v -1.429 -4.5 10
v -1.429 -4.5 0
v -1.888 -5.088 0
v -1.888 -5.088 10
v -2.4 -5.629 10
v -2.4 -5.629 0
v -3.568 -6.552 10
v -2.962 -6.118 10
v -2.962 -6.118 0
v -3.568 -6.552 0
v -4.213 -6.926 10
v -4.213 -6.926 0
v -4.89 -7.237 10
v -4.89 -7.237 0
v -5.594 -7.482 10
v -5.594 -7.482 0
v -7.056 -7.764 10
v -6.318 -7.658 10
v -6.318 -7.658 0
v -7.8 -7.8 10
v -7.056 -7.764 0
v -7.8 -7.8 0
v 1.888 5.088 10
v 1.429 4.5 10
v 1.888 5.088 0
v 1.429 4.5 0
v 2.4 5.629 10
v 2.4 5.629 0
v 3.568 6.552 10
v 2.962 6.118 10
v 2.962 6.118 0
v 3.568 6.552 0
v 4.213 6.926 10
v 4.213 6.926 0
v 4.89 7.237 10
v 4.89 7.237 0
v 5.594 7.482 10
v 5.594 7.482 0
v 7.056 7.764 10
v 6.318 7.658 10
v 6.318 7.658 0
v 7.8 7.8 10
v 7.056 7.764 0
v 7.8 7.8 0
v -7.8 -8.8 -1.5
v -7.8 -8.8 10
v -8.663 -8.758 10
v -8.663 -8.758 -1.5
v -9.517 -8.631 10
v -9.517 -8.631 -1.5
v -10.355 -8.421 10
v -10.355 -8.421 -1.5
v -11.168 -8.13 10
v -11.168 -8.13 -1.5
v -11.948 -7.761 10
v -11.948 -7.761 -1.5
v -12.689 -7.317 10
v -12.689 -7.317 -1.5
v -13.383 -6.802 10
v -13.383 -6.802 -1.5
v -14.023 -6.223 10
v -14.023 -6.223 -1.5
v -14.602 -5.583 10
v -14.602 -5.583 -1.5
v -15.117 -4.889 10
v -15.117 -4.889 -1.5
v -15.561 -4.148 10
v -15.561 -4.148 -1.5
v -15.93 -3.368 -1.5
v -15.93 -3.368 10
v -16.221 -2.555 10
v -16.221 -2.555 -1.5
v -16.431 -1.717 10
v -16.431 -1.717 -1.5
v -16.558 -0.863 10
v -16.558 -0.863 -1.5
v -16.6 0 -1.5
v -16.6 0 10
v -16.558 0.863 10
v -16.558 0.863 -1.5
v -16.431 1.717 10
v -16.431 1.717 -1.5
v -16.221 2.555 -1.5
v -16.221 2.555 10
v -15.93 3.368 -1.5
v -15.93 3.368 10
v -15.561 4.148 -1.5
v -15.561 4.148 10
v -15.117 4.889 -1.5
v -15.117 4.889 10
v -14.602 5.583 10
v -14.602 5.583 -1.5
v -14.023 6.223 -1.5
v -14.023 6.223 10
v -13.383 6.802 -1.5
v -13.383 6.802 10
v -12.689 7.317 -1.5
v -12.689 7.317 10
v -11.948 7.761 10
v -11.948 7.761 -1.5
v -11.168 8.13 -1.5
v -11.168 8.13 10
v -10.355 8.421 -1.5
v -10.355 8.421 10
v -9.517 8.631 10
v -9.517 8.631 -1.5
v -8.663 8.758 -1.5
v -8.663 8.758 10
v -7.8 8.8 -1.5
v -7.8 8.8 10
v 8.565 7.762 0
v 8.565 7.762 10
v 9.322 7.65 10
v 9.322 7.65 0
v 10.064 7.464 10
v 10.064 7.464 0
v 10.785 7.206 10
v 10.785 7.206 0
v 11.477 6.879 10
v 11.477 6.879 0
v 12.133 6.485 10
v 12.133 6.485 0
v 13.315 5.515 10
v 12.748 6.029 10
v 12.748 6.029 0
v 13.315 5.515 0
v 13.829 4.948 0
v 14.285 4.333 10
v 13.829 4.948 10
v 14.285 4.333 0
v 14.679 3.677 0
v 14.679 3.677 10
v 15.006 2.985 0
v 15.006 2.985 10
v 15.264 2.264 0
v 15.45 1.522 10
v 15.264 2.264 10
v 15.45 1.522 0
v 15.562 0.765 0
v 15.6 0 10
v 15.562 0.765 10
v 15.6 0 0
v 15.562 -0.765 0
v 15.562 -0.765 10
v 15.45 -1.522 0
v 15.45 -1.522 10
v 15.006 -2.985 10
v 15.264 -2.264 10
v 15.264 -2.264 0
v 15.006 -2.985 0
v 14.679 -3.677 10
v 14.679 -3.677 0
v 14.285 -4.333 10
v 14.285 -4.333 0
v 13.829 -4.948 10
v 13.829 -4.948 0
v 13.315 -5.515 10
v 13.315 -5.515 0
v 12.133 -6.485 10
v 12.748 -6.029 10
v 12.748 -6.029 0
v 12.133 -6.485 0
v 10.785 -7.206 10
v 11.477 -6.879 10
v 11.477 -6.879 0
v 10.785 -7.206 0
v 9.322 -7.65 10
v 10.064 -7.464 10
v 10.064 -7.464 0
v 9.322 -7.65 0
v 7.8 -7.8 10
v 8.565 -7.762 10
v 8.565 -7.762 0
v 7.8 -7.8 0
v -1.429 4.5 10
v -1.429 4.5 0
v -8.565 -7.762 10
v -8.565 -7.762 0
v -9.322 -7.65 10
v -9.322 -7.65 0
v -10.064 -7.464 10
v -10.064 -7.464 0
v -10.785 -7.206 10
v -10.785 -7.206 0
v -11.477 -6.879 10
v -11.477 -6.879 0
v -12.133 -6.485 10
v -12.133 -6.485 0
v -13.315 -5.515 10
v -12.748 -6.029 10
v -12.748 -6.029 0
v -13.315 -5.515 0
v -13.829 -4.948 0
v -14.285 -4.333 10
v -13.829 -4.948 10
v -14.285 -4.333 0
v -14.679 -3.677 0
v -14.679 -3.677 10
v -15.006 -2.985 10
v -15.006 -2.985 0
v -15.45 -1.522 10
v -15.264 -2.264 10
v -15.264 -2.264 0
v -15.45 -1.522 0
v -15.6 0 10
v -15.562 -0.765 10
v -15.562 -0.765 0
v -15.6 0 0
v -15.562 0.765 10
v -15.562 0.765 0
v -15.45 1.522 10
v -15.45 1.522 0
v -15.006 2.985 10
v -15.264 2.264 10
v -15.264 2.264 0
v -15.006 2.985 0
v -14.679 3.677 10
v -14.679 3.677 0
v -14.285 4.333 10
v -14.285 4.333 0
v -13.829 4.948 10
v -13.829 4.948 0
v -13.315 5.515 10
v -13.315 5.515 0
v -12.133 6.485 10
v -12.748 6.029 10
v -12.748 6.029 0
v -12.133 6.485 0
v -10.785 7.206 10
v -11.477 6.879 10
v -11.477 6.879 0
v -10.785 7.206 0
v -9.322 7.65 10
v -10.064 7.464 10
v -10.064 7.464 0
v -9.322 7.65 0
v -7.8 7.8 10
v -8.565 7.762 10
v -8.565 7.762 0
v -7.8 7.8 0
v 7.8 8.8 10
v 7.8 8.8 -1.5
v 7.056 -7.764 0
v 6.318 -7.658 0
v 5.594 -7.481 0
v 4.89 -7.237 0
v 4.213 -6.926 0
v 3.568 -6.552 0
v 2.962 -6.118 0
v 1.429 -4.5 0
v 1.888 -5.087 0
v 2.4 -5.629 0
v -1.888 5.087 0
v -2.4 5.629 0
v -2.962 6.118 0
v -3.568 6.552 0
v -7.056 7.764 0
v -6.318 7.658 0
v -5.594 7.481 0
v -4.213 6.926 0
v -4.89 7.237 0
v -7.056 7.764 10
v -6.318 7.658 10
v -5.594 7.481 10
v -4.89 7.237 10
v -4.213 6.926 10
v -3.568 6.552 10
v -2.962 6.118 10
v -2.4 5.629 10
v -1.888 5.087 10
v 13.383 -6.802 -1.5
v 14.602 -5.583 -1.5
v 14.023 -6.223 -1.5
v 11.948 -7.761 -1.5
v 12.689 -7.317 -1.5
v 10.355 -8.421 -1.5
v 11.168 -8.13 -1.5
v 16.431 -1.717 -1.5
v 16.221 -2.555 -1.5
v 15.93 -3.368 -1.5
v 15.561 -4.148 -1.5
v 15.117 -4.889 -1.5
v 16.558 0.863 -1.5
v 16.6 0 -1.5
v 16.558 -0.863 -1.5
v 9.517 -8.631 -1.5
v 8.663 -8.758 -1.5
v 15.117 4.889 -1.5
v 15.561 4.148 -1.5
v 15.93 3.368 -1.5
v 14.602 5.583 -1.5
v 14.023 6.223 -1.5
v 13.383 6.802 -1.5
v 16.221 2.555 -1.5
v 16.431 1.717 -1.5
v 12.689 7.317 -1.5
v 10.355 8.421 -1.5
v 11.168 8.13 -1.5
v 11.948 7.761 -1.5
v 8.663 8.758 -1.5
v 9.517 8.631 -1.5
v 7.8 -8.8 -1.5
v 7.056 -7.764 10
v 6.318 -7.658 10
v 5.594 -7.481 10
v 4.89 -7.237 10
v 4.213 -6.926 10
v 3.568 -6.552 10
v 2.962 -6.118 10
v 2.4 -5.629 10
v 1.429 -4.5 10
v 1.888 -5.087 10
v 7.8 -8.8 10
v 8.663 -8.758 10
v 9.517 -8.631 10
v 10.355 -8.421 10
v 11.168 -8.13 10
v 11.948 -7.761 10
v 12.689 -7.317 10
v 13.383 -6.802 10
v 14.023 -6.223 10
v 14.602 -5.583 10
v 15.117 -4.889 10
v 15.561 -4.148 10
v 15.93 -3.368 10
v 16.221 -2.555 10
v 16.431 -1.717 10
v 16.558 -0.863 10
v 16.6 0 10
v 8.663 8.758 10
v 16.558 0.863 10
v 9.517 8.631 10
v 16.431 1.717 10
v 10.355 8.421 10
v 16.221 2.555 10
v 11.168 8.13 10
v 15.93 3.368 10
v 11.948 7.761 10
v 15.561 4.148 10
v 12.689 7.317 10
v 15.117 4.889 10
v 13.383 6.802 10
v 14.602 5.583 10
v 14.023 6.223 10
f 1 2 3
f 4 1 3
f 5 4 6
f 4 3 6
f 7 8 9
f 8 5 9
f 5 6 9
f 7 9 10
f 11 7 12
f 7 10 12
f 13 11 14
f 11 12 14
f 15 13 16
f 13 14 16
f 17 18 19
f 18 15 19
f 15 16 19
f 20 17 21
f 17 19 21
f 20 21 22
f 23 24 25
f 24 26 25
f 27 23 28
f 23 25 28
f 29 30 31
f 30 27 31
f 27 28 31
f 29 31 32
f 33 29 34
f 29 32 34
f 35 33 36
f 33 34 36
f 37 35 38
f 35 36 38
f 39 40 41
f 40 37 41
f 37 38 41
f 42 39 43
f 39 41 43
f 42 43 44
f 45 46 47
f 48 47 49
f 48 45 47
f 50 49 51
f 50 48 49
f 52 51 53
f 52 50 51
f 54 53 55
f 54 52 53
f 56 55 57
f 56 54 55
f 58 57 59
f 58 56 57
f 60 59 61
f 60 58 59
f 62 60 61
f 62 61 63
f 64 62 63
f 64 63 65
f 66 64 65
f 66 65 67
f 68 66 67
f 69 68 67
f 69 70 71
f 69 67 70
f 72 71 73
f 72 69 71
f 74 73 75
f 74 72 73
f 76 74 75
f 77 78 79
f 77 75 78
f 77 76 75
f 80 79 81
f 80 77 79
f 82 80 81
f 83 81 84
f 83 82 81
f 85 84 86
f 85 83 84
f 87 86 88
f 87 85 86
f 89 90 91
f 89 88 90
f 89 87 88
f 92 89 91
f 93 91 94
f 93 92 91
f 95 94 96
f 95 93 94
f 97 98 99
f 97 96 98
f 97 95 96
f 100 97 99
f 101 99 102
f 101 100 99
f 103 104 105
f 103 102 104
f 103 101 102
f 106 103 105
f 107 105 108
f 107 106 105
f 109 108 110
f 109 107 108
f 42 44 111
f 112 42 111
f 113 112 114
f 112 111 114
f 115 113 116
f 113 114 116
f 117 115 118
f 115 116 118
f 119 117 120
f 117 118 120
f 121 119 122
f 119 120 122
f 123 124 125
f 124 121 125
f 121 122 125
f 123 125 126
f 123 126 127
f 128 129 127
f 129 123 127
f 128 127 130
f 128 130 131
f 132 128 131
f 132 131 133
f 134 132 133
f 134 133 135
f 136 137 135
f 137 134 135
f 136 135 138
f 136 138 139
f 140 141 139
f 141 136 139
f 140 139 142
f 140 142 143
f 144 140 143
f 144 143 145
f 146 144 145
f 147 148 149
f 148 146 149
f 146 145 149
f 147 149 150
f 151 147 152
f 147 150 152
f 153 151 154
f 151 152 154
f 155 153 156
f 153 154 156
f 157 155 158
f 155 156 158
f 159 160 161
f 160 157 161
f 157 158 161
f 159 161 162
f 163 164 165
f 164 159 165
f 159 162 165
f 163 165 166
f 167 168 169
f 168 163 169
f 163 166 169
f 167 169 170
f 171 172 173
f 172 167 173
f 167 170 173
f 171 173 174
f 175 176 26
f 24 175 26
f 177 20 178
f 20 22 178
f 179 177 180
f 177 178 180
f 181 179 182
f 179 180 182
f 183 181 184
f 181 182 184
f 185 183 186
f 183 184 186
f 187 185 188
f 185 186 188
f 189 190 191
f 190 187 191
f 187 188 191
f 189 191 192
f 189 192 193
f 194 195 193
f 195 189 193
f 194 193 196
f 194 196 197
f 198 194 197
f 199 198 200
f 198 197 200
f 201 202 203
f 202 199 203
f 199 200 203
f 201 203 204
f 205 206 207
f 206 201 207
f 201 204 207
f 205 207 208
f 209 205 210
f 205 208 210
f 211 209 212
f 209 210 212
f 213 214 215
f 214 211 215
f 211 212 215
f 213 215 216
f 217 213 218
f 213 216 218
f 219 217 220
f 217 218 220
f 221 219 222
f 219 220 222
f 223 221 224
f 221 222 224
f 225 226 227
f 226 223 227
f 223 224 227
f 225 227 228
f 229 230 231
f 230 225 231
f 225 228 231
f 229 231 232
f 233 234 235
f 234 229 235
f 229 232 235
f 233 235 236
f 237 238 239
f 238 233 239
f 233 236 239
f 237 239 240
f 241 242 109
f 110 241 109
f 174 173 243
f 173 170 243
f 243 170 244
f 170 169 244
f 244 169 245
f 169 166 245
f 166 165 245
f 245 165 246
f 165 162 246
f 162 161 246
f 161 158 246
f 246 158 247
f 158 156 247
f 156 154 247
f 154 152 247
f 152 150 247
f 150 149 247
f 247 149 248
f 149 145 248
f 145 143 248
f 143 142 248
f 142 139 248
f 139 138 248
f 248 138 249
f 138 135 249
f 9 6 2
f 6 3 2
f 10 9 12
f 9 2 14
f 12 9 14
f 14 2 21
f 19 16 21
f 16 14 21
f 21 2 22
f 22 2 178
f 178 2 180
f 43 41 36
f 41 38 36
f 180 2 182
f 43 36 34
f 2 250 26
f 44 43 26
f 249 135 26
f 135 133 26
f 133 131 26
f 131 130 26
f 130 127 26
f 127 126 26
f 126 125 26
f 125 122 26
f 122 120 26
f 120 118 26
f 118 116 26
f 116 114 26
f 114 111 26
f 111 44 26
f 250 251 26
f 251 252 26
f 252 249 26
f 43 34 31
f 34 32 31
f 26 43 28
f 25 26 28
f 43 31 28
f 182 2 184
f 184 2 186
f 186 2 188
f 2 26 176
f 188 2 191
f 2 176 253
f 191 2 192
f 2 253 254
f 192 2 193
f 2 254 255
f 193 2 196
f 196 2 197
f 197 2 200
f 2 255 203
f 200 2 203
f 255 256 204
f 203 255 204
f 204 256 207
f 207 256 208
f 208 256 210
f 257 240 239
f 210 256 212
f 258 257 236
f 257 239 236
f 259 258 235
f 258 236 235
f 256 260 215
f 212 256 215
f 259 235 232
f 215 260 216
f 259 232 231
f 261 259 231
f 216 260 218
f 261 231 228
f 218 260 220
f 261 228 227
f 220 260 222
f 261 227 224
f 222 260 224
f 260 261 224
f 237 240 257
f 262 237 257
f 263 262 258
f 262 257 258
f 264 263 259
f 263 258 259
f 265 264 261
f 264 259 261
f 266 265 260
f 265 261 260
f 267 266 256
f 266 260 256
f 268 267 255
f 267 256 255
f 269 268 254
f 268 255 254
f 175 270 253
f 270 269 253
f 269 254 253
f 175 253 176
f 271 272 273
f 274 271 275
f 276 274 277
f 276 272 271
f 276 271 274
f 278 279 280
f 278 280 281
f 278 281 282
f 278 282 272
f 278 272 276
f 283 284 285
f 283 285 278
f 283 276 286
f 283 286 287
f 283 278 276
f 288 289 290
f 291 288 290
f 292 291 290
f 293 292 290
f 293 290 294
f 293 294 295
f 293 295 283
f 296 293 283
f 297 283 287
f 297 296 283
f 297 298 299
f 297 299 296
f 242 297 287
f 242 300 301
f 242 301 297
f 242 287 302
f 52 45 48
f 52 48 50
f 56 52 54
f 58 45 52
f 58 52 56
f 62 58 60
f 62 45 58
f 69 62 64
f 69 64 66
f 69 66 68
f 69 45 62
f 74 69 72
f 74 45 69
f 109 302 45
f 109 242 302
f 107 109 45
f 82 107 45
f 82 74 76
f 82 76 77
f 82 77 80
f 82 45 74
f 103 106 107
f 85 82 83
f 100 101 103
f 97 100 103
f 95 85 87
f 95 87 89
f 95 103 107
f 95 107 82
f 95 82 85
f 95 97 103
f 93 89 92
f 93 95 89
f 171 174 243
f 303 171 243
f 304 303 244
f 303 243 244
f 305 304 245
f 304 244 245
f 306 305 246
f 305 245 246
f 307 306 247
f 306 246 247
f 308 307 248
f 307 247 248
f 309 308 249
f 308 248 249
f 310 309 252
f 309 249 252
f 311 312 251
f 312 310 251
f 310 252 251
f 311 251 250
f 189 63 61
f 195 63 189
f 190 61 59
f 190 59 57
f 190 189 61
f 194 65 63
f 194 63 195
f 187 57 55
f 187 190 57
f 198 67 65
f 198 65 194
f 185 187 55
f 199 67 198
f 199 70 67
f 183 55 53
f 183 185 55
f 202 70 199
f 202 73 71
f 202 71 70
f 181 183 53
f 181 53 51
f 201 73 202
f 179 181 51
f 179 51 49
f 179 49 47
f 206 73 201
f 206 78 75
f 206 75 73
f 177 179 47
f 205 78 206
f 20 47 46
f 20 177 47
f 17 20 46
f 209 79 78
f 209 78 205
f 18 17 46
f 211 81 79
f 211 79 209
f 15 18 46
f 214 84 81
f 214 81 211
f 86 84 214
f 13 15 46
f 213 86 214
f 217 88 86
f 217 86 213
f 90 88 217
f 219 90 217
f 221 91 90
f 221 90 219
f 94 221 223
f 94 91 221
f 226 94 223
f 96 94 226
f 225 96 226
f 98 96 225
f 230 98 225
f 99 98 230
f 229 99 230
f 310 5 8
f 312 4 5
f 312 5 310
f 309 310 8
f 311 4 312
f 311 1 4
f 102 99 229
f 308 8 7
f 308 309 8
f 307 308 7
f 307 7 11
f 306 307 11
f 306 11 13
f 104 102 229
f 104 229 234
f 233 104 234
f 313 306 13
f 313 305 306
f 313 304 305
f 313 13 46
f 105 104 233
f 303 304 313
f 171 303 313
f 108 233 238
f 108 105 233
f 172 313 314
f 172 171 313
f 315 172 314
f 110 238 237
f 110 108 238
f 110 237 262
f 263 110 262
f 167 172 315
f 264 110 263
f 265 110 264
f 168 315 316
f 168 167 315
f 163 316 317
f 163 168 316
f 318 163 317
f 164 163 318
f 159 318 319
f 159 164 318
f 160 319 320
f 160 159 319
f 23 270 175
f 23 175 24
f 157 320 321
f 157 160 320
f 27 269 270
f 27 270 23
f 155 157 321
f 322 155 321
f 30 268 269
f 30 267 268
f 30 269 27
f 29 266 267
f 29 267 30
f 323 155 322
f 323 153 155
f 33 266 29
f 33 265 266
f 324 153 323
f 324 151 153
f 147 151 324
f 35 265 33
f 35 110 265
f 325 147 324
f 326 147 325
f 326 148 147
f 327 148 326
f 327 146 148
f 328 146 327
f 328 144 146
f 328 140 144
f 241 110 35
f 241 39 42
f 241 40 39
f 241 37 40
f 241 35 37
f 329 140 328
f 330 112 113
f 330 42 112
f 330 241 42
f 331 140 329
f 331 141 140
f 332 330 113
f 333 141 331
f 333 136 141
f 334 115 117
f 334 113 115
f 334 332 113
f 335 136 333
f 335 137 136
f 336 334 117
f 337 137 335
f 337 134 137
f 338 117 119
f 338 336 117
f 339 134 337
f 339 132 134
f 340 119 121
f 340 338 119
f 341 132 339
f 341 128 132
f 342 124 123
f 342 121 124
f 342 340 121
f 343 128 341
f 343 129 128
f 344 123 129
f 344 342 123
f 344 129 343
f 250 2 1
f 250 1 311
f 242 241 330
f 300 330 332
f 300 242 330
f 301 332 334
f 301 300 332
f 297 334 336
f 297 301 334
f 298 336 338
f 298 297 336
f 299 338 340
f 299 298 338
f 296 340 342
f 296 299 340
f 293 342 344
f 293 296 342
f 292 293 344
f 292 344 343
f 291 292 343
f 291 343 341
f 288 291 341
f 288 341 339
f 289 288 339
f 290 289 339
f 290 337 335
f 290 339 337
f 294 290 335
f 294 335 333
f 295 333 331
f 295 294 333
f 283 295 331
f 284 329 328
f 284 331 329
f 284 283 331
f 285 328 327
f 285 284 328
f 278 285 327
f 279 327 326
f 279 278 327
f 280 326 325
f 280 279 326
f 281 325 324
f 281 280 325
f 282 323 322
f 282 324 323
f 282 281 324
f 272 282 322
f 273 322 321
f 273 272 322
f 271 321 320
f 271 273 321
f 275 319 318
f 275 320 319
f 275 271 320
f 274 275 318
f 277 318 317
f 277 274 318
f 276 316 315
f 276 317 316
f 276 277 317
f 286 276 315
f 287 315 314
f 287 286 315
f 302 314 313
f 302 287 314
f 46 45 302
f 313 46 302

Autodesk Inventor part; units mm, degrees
ref_plane "YZ Plane" through (0, 0, 0) normal (1, 0, 0) x (0, 1, 0)
ref_plane "XZ Plane" through (0, 0, 0) normal (0, 1, 0) x (-1, 0, 0)
ref_plane "XY Plane" through (0, 0, 0) normal (0, 0, 1) x (1, 0, 0)
sketch "スケッチ1" plane through (0, 0, 0) normal (0, 0, 1) x (1, 0, 0)
  arc A0 (7.8, -7.8) -> (7.8, 7.8) centre (7.8, 0) ccw
  arc A1 (-7.8, 7.8) -> (-7.8, -7.8) centre (-7.8, 0) ccw
  line L0 (-7.8, 7.8) -> (7.8, 7.8)
  line L1 (7.8, -7.8) -> (-7.8, -7.8)
  line L2 (7.8, 8.8) -> (-7.8, 8.8)
  arc A2 (-7.8, 8.8) -> (-7.8, -8.8) centre (-7.8, 0) ccw
  line L3 (-7.8, -8.8) -> (7.8, -8.8)
  arc A3 (7.8, -8.8) -> (7.8, 8.8) centre (7.8, 0) ccw
  point P0 (0, 0)
  dimension "d0" = 15.6
  dimension "d1" = 15.6
  dimension "d2" = 7.8
  dimension "d3" = 1
extrude "押し出し1" add sketch "スケッチ1" along normal blind 10
sketch "スケッチ2" plane through (0, 0, 0) normal (0, 0, -1) x (-1, 0, 0)
  line L0 (-7.8, 7.8) -> (7.8, 7.8) projected
  arc A0 (7.8, -7.8) -> (7.8, 7.8) centre (7.8, 0) ccw projected
  line L1 (7.8, -7.8) -> (-7.8, -7.8) projected
  arc A1 (-7.8, 7.8) -> (-7.8, -7.8) centre (-7.8, 0) ccw projected
  line L2 (-7.8, 8.8) -> (7.8, 8.8) projected
  arc A2 (-7.8, 8.8) -> (-7.8, -8.8) centre (-7.8, 0) ccw projected
  line L3 (7.8, -8.8) -> (-7.8, -8.8) projected
  arc A3 (7.8, -8.8) -> (7.8, 8.8) centre (7.8, 0) ccw projected
  point P0 (0, 0)
extrude "押し出し2" add sketch "スケッチ2" along normal blind 1.5 contours L0 A0 L1 A1 | L2 A3 L3 A2
sketch "スケッチ3" plane through (0, 0, 0) normal (0, 0, 1) x (1, 0, 0)
  arc A0 (-7.8, 7.8) -> (-7.8, -7.8) centre (-7.8, 0) ccw projected
  arc A1 (-7.8, -7.8) -> (-1.429, -4.5) centre (-7.8, 0) ccw
  arc A2 (7.8, -7.8) -> (7.8, 7.8) centre (7.8, 0) ccw projected
  arc A3 (1.429, -4.5) -> (7.8, -7.8) centre (7.8, 0) ccw
  line L0 (-1.429, -4.5) -> (1.429, -4.5)
  line L1 (7.8, -7.8) -> (-7.8, -7.8) projected
  line L2 (-7.8, -7.8) -> (7.8, -7.8)
  arc A4 (-1.429, 4.5) -> (-7.8, 7.8) centre (-7.8, 0) ccw
  arc A5 (7.8, 7.8) -> (1.429, 4.5) centre (7.8, 0) ccw
  line L3 (-1.429, 4.5) -> (1.429, 4.5)
  line L4 (-7.8, 7.8) -> (7.8, 7.8) projected
  line L5 (7.8, 7.8) -> (-7.8, 7.8)
  point P0 (0, 0)
  dimension "d9" = 9
extrude "押し出し3" add sketch "スケッチ3" along normal up to surface (10 mm away) contours L4 A5 L3 A4 | A1 L0 A3 L1
properties part number "CaseBottom_CR123A"
